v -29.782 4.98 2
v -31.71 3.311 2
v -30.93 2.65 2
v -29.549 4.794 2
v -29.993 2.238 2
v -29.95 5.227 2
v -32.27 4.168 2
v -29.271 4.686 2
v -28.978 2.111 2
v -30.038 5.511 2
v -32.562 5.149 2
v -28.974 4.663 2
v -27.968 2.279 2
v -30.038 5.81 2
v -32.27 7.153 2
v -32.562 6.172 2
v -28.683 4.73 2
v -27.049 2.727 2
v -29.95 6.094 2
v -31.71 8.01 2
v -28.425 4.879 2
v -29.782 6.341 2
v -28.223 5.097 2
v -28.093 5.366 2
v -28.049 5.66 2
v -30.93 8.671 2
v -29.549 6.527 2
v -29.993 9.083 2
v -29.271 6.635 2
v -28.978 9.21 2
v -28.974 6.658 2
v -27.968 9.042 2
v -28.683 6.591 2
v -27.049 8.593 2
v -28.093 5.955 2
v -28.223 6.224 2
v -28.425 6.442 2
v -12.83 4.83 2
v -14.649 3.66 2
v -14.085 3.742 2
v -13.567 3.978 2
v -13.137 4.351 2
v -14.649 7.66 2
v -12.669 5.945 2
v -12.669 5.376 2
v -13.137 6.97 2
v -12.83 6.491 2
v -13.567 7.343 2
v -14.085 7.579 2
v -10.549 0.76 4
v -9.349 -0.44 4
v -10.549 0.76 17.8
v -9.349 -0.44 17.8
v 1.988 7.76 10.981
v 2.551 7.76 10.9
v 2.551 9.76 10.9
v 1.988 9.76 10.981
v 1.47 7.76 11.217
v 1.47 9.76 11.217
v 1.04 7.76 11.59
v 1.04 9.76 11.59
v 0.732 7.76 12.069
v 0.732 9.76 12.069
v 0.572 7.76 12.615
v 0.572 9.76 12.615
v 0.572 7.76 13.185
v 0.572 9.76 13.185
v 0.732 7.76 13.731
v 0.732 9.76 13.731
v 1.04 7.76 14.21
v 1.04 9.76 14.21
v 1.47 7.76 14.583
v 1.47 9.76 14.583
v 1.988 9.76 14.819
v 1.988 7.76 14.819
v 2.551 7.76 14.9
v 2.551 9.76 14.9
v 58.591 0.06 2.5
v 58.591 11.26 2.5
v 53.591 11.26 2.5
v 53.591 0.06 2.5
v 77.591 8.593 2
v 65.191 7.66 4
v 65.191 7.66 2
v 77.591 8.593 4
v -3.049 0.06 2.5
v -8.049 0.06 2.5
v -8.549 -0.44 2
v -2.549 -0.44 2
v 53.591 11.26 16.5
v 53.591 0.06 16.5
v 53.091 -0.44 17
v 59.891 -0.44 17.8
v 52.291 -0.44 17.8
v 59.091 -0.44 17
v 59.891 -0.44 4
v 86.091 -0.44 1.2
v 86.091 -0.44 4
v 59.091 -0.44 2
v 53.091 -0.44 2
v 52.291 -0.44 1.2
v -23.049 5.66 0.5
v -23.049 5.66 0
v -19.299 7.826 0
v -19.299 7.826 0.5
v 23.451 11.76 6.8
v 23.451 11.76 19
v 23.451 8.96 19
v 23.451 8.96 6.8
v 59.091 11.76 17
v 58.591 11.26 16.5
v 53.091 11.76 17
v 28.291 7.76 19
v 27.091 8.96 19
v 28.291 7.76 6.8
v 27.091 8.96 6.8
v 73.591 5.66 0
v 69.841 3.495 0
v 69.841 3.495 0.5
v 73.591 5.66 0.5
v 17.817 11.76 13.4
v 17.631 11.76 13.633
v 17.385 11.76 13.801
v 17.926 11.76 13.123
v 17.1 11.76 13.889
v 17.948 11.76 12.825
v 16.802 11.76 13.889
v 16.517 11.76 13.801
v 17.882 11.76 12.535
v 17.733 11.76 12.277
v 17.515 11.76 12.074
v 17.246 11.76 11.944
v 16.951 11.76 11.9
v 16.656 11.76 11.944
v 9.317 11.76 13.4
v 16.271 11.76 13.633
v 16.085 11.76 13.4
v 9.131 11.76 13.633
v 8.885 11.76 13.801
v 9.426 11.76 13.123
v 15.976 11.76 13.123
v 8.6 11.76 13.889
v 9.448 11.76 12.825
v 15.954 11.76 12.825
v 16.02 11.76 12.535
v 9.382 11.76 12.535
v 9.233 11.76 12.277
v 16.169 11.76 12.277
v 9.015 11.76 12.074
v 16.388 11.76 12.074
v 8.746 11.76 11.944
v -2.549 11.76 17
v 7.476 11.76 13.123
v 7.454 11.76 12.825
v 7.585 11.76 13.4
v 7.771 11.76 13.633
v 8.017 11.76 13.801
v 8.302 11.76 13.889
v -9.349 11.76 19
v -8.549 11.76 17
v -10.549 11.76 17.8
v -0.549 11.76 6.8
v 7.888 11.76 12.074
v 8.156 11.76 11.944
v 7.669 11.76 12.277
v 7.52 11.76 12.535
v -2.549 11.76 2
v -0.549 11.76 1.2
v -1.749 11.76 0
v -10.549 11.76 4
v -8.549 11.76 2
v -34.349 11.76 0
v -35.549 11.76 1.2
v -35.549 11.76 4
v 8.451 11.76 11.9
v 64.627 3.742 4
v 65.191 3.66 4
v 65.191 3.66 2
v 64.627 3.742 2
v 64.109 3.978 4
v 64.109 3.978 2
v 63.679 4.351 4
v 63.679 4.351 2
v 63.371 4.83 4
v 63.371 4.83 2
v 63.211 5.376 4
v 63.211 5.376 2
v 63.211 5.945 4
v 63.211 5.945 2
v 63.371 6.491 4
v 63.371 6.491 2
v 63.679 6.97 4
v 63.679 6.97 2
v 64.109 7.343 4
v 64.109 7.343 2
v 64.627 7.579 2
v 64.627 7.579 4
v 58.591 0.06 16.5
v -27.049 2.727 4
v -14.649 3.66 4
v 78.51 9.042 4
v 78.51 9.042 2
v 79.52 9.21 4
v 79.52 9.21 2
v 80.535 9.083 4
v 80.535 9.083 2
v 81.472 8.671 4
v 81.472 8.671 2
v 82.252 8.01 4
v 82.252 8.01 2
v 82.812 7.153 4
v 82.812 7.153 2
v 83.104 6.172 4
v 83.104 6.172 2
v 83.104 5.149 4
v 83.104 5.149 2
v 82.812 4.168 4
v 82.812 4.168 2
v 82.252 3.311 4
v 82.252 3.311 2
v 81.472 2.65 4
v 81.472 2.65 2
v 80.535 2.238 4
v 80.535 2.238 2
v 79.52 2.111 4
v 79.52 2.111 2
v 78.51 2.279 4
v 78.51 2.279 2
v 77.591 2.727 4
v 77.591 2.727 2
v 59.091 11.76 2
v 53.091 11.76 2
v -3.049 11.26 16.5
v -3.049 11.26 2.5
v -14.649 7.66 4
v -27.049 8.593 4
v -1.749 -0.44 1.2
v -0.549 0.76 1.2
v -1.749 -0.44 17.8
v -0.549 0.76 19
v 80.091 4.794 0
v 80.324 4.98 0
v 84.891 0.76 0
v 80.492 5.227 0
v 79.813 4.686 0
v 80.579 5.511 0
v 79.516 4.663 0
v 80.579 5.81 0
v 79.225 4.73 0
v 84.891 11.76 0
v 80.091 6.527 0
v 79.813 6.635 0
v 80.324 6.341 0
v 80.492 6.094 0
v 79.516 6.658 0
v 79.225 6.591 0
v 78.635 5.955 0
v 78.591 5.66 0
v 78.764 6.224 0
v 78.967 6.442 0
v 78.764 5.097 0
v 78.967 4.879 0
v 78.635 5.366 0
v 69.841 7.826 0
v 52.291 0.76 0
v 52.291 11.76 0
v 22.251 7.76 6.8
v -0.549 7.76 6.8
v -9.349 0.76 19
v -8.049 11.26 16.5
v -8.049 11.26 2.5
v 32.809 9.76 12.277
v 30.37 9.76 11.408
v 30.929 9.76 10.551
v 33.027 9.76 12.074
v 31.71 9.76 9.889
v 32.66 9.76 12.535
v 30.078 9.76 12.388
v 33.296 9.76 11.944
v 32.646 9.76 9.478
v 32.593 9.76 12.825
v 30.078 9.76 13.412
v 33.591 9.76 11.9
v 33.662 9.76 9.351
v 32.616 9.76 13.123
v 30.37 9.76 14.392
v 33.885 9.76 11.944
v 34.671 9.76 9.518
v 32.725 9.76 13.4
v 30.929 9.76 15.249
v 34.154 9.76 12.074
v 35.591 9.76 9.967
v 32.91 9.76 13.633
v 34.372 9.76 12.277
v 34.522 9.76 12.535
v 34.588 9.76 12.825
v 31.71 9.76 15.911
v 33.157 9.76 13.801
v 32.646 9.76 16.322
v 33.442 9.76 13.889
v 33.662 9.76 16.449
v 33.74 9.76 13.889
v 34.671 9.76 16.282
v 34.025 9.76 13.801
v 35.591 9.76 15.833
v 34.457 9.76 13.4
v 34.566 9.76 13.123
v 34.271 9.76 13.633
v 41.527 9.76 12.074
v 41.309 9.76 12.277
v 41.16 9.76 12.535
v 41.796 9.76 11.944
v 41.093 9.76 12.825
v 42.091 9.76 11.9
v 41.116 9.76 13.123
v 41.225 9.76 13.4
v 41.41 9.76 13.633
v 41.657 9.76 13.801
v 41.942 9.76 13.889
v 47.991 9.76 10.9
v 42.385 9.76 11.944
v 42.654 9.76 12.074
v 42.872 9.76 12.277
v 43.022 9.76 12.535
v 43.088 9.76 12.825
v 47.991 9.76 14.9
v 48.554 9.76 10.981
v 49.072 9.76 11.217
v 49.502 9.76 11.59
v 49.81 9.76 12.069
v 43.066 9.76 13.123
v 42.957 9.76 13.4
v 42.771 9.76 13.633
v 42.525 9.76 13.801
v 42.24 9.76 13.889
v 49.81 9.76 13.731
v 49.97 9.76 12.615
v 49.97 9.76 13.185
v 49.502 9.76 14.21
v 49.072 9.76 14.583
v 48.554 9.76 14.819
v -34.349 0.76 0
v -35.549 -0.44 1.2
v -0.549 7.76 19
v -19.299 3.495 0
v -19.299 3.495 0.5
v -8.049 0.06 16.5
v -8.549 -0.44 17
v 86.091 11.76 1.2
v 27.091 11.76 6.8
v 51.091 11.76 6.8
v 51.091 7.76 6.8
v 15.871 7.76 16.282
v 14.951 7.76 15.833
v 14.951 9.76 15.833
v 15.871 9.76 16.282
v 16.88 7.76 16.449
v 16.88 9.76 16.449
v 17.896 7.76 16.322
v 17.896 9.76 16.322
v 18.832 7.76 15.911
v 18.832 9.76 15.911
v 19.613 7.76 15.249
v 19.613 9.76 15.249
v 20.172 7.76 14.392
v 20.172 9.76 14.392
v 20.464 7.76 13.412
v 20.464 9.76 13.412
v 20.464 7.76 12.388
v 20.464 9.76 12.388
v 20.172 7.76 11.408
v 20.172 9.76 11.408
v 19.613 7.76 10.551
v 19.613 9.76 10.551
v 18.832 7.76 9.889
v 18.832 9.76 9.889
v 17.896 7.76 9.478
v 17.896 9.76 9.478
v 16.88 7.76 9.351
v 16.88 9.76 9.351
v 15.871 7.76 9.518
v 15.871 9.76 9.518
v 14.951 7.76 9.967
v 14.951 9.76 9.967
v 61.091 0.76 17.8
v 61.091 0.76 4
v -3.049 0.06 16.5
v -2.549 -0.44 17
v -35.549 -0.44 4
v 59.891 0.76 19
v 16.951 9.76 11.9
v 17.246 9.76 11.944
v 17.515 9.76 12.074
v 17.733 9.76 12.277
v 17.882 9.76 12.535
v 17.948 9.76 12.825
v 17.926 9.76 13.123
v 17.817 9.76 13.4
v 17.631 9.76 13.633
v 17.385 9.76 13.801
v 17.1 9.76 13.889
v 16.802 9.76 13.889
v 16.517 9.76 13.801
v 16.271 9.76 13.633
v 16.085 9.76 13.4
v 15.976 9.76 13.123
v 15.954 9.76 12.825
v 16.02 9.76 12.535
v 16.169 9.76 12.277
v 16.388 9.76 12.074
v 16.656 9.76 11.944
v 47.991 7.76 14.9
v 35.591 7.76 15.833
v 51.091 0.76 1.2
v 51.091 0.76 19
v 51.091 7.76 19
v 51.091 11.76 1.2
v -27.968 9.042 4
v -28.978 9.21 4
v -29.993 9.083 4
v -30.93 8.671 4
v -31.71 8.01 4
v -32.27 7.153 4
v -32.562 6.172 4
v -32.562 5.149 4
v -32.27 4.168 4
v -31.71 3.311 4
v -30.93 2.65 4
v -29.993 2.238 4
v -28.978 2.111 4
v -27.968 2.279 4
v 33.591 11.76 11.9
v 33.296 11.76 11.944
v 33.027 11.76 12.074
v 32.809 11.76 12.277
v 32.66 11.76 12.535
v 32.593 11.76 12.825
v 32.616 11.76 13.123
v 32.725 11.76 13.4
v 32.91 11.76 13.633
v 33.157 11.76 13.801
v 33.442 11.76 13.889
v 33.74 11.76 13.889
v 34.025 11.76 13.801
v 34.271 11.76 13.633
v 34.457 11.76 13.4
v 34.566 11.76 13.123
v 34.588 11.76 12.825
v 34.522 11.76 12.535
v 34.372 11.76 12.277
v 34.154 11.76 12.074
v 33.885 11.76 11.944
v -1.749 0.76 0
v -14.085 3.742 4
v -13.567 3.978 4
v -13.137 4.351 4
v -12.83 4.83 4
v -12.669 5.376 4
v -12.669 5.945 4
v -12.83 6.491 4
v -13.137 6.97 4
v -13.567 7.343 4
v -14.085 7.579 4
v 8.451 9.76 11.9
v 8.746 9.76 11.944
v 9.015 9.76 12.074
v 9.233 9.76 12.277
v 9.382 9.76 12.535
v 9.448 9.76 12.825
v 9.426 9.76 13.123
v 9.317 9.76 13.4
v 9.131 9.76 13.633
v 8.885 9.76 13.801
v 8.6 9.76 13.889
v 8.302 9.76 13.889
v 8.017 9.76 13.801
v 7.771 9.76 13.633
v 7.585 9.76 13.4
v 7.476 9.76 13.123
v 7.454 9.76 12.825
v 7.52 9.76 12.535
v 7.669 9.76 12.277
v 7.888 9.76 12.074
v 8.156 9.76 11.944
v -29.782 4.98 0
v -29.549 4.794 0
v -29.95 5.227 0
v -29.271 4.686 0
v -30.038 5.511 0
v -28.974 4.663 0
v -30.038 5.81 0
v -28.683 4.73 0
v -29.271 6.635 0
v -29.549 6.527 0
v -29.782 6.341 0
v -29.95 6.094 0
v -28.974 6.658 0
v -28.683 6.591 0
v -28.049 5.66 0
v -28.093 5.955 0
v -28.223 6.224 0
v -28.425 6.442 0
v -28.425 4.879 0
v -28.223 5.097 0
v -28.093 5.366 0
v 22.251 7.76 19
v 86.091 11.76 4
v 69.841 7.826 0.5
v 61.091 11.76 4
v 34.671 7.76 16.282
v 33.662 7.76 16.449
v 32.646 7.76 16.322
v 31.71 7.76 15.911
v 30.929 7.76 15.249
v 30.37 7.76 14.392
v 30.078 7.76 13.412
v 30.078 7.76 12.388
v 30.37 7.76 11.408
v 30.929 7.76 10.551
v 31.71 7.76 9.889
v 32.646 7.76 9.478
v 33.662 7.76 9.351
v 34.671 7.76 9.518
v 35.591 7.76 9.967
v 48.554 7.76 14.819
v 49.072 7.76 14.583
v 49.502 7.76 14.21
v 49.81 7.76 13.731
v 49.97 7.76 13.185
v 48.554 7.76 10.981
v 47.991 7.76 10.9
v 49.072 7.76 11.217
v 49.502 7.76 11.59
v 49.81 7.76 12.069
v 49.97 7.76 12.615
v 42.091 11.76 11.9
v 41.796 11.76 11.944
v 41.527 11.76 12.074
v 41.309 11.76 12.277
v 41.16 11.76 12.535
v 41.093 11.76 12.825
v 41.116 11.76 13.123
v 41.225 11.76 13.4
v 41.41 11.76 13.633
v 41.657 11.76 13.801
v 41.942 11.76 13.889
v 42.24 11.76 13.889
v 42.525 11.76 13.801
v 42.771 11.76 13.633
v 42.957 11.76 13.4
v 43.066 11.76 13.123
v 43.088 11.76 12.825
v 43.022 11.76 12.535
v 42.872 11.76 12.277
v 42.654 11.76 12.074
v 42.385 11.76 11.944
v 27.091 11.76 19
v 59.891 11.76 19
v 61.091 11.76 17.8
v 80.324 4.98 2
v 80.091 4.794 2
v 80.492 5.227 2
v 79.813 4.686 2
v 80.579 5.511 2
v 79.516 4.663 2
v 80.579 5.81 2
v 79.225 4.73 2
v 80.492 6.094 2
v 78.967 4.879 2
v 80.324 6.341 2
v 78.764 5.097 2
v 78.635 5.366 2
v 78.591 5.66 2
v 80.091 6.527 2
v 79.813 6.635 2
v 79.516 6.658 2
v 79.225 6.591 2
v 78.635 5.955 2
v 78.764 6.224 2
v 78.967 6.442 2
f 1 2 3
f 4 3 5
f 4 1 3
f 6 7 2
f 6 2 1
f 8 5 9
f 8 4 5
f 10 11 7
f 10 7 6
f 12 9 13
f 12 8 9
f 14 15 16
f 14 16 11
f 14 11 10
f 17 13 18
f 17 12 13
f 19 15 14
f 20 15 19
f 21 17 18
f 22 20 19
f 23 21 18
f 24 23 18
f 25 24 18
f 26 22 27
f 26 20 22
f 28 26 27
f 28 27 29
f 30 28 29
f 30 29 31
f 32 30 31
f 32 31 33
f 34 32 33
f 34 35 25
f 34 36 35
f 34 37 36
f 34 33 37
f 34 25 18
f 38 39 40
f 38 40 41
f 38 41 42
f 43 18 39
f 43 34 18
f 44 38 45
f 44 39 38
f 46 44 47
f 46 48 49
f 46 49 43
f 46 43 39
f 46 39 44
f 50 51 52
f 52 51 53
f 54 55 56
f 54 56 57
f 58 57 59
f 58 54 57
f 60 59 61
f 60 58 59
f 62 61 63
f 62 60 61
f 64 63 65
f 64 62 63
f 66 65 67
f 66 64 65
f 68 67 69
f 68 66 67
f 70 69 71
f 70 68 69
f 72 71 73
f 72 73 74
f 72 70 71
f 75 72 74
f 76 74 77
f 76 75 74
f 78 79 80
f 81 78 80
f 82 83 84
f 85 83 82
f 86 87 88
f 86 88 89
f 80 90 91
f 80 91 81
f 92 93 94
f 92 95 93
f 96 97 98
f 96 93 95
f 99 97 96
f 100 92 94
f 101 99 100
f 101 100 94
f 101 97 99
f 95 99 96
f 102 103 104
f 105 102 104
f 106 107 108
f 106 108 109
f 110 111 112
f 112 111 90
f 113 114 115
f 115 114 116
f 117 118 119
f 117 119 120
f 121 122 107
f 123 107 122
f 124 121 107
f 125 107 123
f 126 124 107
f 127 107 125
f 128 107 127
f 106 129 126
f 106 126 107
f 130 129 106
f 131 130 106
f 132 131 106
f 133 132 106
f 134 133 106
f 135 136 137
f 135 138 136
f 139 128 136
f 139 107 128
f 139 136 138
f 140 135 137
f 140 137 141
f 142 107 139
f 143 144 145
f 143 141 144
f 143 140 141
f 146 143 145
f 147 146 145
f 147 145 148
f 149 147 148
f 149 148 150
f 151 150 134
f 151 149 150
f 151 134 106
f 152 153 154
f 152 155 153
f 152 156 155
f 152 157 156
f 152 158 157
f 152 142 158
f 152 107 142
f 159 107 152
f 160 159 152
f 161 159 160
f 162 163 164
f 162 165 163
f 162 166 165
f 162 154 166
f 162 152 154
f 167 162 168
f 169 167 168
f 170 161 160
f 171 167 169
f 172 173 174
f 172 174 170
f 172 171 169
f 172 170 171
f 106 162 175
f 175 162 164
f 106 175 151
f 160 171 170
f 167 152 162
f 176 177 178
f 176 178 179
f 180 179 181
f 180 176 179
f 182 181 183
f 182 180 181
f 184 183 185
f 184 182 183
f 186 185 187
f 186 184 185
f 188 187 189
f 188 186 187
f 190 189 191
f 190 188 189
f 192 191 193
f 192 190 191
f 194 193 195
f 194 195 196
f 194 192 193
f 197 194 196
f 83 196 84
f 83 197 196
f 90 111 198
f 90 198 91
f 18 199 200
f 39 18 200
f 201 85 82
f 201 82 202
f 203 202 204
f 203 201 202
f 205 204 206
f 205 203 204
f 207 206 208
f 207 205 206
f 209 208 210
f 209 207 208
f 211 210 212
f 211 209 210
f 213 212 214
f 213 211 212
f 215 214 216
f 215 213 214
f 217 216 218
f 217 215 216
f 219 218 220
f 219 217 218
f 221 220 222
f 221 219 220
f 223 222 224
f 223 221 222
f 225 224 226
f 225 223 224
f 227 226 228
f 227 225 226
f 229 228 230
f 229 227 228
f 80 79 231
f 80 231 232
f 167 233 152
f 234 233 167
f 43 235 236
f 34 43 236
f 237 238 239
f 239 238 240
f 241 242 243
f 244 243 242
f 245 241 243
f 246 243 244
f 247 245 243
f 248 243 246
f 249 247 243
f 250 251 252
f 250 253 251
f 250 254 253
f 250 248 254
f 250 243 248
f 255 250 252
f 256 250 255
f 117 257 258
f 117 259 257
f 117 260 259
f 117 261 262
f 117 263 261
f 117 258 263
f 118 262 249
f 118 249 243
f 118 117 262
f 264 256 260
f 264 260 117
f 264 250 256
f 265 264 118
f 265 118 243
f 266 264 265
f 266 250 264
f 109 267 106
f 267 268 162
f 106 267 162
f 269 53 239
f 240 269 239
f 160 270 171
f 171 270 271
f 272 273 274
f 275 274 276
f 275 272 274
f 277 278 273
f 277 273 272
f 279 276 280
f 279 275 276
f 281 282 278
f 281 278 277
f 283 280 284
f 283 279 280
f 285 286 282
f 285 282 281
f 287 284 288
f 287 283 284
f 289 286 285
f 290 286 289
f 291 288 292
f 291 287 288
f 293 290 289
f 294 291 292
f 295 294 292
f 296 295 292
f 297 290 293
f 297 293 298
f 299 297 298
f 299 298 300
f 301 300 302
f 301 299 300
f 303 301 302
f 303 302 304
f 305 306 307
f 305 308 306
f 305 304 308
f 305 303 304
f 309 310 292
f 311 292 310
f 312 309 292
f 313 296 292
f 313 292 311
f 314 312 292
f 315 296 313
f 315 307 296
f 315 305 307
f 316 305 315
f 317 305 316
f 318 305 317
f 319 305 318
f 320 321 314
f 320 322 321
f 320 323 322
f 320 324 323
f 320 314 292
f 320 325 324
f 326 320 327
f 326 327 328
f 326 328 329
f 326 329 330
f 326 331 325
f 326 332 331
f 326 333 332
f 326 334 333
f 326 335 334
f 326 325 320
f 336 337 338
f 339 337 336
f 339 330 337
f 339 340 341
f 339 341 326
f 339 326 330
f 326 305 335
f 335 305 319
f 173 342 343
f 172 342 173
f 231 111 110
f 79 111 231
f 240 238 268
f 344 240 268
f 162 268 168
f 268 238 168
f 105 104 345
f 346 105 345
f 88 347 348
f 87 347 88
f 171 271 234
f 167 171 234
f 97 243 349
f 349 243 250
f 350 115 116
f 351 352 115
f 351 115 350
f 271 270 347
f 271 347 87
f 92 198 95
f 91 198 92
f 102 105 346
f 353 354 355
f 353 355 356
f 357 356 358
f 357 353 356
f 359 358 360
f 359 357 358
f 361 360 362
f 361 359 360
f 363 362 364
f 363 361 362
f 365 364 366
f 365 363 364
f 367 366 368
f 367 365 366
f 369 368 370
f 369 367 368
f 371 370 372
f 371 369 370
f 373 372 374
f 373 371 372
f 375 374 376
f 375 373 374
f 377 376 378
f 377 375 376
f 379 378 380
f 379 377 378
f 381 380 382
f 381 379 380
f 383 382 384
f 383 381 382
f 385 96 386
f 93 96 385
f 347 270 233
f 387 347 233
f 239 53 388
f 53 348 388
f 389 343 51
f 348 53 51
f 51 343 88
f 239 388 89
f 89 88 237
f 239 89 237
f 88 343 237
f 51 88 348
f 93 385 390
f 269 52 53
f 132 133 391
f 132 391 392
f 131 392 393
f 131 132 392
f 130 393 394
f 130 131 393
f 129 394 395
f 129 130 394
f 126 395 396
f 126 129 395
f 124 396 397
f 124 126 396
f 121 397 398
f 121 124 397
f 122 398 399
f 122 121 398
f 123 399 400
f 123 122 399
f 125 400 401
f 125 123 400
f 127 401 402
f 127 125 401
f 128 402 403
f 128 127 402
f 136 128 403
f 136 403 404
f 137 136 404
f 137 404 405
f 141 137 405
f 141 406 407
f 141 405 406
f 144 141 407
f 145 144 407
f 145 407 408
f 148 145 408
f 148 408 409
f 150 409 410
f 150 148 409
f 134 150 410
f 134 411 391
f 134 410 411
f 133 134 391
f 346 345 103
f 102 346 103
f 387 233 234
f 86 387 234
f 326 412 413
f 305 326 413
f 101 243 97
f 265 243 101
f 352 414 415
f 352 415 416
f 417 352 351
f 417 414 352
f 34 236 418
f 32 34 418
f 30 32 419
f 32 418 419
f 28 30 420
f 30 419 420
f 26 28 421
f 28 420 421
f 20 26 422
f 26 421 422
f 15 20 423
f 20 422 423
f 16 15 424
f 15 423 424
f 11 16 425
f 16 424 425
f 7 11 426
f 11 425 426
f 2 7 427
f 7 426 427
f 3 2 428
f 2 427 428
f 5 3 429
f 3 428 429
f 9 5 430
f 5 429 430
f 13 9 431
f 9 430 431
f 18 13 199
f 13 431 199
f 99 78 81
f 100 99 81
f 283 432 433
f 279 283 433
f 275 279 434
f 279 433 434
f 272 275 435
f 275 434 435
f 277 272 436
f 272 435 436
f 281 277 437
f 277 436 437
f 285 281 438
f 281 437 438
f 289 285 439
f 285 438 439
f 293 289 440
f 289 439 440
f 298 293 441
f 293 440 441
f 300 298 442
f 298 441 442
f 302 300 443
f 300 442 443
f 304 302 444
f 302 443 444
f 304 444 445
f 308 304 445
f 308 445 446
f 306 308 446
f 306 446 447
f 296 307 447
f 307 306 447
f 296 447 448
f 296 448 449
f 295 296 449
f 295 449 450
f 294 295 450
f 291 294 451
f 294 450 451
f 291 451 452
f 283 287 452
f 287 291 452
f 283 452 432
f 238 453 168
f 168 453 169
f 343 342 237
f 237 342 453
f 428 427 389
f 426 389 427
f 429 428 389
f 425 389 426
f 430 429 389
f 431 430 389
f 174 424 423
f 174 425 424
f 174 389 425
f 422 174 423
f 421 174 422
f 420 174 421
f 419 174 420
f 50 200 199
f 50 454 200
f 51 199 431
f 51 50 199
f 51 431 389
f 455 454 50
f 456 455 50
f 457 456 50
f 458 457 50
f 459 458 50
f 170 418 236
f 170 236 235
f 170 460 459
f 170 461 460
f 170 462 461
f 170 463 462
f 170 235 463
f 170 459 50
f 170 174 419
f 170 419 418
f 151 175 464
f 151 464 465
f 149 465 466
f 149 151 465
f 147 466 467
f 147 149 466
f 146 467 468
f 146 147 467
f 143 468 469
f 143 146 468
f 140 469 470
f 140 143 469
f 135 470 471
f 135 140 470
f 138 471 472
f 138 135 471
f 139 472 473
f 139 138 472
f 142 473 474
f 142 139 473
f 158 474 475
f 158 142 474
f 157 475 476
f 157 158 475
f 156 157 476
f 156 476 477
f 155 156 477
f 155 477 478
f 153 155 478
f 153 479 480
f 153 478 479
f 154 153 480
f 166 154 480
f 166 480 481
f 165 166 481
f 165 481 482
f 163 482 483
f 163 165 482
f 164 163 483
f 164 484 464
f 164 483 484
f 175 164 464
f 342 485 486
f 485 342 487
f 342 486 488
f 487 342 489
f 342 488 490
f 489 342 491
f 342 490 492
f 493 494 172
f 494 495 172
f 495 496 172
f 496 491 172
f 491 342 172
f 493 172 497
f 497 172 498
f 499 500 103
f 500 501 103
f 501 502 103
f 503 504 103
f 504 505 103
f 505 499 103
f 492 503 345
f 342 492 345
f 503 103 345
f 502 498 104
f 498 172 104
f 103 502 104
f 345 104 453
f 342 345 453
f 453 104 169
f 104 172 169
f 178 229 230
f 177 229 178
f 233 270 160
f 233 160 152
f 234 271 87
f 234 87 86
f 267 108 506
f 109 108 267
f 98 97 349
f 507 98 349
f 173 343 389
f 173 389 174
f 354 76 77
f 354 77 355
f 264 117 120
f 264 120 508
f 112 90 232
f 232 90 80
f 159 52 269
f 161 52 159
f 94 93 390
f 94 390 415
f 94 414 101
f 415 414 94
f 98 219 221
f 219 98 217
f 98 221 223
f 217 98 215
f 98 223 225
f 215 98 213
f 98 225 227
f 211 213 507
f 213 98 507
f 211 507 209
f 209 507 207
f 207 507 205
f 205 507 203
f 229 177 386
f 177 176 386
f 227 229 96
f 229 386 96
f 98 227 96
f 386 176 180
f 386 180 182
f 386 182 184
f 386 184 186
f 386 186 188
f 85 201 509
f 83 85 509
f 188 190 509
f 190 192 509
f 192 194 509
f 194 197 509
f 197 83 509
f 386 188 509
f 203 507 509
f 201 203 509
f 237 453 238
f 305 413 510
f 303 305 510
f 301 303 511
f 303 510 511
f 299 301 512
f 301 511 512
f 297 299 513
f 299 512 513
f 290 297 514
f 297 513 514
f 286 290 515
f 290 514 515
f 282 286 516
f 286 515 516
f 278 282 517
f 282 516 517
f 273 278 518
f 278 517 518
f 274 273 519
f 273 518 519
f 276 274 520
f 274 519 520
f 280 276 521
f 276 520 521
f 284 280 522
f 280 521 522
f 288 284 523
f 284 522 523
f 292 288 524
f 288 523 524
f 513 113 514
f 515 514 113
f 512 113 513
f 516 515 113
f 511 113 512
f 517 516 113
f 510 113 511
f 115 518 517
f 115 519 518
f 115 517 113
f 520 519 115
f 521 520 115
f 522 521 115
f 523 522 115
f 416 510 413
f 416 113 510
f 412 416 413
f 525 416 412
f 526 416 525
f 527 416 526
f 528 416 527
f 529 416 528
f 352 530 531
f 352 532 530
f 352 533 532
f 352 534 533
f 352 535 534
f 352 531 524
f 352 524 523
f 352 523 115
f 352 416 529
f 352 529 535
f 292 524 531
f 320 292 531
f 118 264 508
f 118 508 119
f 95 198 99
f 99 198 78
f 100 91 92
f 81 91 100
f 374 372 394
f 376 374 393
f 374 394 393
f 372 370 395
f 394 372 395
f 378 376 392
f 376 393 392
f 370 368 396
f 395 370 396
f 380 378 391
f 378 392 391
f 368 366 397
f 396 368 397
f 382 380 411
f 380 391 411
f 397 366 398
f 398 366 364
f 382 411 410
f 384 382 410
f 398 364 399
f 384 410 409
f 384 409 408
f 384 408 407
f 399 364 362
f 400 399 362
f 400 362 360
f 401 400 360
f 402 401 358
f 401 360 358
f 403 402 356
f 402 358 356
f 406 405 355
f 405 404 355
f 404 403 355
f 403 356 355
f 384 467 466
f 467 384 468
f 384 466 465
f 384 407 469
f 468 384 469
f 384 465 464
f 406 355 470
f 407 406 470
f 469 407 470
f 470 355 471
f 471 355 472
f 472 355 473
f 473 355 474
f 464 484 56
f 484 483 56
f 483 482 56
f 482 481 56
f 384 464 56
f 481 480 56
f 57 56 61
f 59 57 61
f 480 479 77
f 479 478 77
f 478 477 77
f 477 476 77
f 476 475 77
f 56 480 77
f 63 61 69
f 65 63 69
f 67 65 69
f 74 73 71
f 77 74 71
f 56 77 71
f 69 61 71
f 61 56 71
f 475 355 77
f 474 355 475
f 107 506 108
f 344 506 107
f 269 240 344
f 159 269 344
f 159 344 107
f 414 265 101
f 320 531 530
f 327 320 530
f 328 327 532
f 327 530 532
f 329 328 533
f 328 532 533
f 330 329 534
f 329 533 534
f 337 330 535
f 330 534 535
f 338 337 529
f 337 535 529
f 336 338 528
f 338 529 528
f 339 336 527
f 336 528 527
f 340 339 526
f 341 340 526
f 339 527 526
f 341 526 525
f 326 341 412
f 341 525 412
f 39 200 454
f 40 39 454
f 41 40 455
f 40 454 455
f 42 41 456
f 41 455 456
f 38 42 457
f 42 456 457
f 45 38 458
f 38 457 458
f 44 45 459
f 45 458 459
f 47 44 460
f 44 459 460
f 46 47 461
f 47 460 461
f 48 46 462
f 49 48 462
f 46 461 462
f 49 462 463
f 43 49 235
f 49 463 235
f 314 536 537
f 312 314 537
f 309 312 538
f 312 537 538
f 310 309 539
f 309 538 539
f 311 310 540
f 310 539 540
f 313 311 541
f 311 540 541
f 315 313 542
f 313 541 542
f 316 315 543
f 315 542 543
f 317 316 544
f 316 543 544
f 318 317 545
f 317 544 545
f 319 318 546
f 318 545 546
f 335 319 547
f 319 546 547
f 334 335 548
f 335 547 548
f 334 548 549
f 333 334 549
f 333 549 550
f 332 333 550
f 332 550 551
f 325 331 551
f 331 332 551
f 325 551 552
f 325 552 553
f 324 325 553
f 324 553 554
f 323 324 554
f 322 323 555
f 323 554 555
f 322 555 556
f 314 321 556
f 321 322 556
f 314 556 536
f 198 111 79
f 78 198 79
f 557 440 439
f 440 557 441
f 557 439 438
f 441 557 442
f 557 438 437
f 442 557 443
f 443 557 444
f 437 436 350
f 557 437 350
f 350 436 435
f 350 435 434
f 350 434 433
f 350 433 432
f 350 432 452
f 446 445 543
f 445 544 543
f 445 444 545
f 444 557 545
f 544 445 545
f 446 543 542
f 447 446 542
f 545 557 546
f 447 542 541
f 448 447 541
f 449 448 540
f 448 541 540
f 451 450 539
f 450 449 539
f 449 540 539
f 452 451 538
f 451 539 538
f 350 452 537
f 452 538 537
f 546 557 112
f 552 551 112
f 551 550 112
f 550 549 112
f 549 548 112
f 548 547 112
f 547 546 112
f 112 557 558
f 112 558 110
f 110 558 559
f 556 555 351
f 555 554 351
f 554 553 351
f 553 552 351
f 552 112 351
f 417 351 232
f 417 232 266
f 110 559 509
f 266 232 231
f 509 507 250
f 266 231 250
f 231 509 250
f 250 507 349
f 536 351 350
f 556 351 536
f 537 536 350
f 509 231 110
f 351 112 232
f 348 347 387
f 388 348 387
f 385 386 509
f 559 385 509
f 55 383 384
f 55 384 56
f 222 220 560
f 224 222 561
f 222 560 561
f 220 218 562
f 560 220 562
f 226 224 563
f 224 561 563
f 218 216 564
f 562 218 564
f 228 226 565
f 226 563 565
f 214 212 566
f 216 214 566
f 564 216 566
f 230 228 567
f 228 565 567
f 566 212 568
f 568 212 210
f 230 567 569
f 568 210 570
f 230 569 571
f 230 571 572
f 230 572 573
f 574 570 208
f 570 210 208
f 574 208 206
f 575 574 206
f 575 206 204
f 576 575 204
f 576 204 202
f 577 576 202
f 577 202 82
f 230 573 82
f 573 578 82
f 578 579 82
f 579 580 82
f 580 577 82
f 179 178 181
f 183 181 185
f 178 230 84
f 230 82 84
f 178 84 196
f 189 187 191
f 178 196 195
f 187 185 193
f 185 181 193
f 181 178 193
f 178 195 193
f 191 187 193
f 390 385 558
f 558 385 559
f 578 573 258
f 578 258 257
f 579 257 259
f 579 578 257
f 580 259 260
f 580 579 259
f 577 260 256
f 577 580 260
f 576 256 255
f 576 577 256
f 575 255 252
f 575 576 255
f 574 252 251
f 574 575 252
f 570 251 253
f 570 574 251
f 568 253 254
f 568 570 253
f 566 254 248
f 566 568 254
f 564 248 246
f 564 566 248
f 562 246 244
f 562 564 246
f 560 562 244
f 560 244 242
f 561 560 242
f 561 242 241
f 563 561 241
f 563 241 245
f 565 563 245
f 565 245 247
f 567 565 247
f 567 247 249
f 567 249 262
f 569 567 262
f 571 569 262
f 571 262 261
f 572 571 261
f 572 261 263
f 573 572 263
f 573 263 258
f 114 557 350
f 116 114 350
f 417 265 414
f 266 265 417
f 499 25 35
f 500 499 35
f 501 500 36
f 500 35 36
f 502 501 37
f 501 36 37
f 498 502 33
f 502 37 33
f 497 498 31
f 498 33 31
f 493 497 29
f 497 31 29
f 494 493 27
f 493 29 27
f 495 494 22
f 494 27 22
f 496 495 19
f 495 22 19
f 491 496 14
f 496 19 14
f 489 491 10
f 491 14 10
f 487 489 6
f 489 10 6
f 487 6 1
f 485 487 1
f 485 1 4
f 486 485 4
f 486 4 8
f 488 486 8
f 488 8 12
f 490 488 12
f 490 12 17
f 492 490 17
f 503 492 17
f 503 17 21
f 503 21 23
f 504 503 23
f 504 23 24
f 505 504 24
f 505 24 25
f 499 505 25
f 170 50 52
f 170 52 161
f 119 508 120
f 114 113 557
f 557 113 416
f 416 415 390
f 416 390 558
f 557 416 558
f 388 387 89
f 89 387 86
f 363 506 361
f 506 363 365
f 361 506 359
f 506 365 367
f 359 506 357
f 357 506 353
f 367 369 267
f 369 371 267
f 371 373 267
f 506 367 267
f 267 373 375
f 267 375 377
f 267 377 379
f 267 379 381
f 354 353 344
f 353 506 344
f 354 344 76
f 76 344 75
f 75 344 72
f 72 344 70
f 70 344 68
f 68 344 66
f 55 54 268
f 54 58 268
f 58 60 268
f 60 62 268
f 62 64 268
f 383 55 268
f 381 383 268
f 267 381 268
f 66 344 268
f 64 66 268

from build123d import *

# Parameters (mm, degrees)
SKETCH1_W               = 35
SKETCH1_H               = 12.2
BOSS_EXTRUDE1_DEPTH     = 4
SKETCH2_R               = 1
CUT_EXTRUDE1_DEPTH      = 38.656658625
SKETCH3_W               = 10
SKETCH3_H               = 12.2
BOSS_EXTRUDE2_DEPTH     = 15
SKETCH4_W               = 12.2
SKETCH4_H               = 4
BOSS_EXTRUDE3_DEPTH     = 24
CUT_EXTRUDE2_DEPTH      = 42.133377247
CUT_EXTRUDE2_DEPTH_BACK = 42.133377247
SKETCH5_R               = 1
CUT_EXTRUDE3_DEPTH      = 0.5
CHAMFER1_SIZE           = 1.2
CUT_EXTRUDE17_DEPTH     = 2
CUT_EXTRUDE18_DEPTH     = 2
SKETCH26_W              = 5
SKETCH26_H              = 14
CUT_EXTRUDE19_DEPTH     = 43.113593099
CHAMFER2_SIZE           = 0.5


with BuildPart() as part:
    # Sketch1 → Boss-Extrude1 (new body)
    with BuildSketch(Plane.XY):
        with Locations((-18.048765432, 5.660493827)):
            Rectangle(SKETCH1_W, SKETCH1_H)
    extrude(amount=BOSS_EXTRUDE1_DEPTH)

    # Sketch2 → Cut-Extrude1 (cut, through all)
    with BuildSketch(Plane.XY.offset(4)):
        with Locations((-29.048765432, 5.660493827)):
            Circle(SKETCH2_R)
    extrude(amount=-CUT_EXTRUDE1_DEPTH, mode=Mode.SUBTRACT)

    # Sketch3 → Boss-Extrude2 (add)
    with BuildSketch(Plane.XY.offset(4)):
        with Locations((-5.548765432, 5.660493827)):
            Rectangle(SKETCH3_W, SKETCH3_H)
    extrude(amount=BOSS_EXTRUDE2_DEPTH)

    # Sketch4 → Boss-Extrude3 (add)
    with BuildSketch(Plane(origin=(-0.548765432, 0, 0), x_dir=(0, 0, -1), z_dir=(1, 0, 0))):
        with Locations((-12.9, 9.760493827)):
            Rectangle(SKETCH4_W, SKETCH4_H)
    extrude(amount=BOSS_EXTRUDE3_DEPTH)

    # Sketch5 → Cut-Extrude2 (cut, two sides: drawn at the far end of the back side and taken through both)
    with BuildSketch(Plane.XZ.offset(-7.760493827).offset(-CUT_EXTRUDE2_DEPTH_BACK)):
        with Locations(Location((16.951234568, 12.9, 0), (0, 0, 270))):
            Circle(SKETCH5_R)
        with Locations(Location((8.451234568, 12.9, 0), (0, 0, 270))):
            Circle(SKETCH5_R)
    extrude(amount=CUT_EXTRUDE2_DEPTH + CUT_EXTRUDE2_DEPTH_BACK, mode=Mode.SUBTRACT)

    # Sketch7 → Cut-Extrude3 (cut)
    with BuildSketch(Plane(origin=(0, 0, 0), x_dir=(-1, 0, 0), z_dir=(0, 0, -1))):
        Polygon((23.048765432, 5.660493827), (19.298765432, 7.825557337), (19.298765432, 3.495430318), align=None)
    extrude(amount=-CUT_EXTRUDE3_DEPTH, mode=Mode.SUBTRACT)

    # Chamfer1
    chamfer1_edges = [part.edges().sort_by_distance(p)[0] for p in [
        (-10.548765432, -0.439506173, 11.5),
        (-10.548765432, 5.660493827, 19),
        (-5.548765432, -0.439506173, 19),
        (23.451234568, 7.760493827, 12.9),
        (-0.548765432, 5.660493827, 0),
        (-18.048765432, -0.439506173, 0),
        (-35.548765432, 5.660493827, 0),
        (-0.548765432, -0.439506173, 9.5),
    ]]
    chamfer(chamfer1_edges, length=CHAMFER1_SIZE)

    # Sketch24 → Cut-Extrude17 (cut)
    with BuildSketch(Plane.XY.offset(4)):
        with BuildLine():
            Line((-27.048765432, 2.727491952), (-14.648765432, 3.660493827))
            ThreePointArc((-14.648765432, 3.660493827), (-12.648765432, 5.660493827), (-14.648765432, 7.660493827))
            Line((-14.648765432, 7.660493827), (-27.048765432, 8.593495702))
            ThreePointArc((-27.048765432, 8.593495702), (-32.598765432, 5.660493827), (-27.048765432, 2.727491952))
        make_face()
    extrude(amount=-CUT_EXTRUDE17_DEPTH, mode=Mode.SUBTRACT)

    # Sketch25 → Cut-Extrude18 (cut)
    with BuildSketch(Plane.XZ.offset(-7.760493827)):
        with BuildLine():
            Line((2.551234568, 14.9), (14.951234568, 15.833001875))
            ThreePointArc((14.951234568, 15.833001875), (20.501234568, 12.9), (14.951234568, 9.966998125))
            Line((14.951234568, 9.966998125), (2.551234568, 10.9))
            ThreePointArc((2.551234568, 10.9), (0.551234568, 12.9), (2.551234568, 14.9))
        make_face()
    extrude(amount=-CUT_EXTRUDE18_DEPTH, mode=Mode.SUBTRACT)

    # Sketch26 → Cut-Extrude19 (cut, through all)
    with BuildSketch(Plane(origin=(0, 11.760493827, 0), x_dir=(1, 0, 0), z_dir=(0, 1, 0))):
        with Locations((-5.548765432, -9.5)):
            Rectangle(SKETCH26_W, SKETCH26_H)
    extrude(amount=-CUT_EXTRUDE19_DEPTH, mode=Mode.SUBTRACT)

    # Chamfer2
    chamfer2_edges = [part.edges().sort_by_distance(p)[0] for p in [
        (-8.048765432, -0.439506173, 9.5),
        (-5.548765432, -0.439506173, 2.5),
        (-3.048765432, -0.439506173, 9.5),
        (-5.548765432, -0.439506173, 16.5),
        (-8.048765432, 11.760493827, 9.5),
        (-5.548765432, 11.760493827, 16.5),
        (-3.048765432, 11.760493827, 9.5),
        (-5.548765432, 11.760493827, 2.5),
    ]]
    chamfer(chamfer2_edges, length=CHAMFER2_SIZE)


with BuildPart() as body_2:
    # Mirror1: mirrored copy
    add(part.part.mirror(Plane.ZY.offset(-25.270949191)))


solid = Compound([part.part, body_2.part])
